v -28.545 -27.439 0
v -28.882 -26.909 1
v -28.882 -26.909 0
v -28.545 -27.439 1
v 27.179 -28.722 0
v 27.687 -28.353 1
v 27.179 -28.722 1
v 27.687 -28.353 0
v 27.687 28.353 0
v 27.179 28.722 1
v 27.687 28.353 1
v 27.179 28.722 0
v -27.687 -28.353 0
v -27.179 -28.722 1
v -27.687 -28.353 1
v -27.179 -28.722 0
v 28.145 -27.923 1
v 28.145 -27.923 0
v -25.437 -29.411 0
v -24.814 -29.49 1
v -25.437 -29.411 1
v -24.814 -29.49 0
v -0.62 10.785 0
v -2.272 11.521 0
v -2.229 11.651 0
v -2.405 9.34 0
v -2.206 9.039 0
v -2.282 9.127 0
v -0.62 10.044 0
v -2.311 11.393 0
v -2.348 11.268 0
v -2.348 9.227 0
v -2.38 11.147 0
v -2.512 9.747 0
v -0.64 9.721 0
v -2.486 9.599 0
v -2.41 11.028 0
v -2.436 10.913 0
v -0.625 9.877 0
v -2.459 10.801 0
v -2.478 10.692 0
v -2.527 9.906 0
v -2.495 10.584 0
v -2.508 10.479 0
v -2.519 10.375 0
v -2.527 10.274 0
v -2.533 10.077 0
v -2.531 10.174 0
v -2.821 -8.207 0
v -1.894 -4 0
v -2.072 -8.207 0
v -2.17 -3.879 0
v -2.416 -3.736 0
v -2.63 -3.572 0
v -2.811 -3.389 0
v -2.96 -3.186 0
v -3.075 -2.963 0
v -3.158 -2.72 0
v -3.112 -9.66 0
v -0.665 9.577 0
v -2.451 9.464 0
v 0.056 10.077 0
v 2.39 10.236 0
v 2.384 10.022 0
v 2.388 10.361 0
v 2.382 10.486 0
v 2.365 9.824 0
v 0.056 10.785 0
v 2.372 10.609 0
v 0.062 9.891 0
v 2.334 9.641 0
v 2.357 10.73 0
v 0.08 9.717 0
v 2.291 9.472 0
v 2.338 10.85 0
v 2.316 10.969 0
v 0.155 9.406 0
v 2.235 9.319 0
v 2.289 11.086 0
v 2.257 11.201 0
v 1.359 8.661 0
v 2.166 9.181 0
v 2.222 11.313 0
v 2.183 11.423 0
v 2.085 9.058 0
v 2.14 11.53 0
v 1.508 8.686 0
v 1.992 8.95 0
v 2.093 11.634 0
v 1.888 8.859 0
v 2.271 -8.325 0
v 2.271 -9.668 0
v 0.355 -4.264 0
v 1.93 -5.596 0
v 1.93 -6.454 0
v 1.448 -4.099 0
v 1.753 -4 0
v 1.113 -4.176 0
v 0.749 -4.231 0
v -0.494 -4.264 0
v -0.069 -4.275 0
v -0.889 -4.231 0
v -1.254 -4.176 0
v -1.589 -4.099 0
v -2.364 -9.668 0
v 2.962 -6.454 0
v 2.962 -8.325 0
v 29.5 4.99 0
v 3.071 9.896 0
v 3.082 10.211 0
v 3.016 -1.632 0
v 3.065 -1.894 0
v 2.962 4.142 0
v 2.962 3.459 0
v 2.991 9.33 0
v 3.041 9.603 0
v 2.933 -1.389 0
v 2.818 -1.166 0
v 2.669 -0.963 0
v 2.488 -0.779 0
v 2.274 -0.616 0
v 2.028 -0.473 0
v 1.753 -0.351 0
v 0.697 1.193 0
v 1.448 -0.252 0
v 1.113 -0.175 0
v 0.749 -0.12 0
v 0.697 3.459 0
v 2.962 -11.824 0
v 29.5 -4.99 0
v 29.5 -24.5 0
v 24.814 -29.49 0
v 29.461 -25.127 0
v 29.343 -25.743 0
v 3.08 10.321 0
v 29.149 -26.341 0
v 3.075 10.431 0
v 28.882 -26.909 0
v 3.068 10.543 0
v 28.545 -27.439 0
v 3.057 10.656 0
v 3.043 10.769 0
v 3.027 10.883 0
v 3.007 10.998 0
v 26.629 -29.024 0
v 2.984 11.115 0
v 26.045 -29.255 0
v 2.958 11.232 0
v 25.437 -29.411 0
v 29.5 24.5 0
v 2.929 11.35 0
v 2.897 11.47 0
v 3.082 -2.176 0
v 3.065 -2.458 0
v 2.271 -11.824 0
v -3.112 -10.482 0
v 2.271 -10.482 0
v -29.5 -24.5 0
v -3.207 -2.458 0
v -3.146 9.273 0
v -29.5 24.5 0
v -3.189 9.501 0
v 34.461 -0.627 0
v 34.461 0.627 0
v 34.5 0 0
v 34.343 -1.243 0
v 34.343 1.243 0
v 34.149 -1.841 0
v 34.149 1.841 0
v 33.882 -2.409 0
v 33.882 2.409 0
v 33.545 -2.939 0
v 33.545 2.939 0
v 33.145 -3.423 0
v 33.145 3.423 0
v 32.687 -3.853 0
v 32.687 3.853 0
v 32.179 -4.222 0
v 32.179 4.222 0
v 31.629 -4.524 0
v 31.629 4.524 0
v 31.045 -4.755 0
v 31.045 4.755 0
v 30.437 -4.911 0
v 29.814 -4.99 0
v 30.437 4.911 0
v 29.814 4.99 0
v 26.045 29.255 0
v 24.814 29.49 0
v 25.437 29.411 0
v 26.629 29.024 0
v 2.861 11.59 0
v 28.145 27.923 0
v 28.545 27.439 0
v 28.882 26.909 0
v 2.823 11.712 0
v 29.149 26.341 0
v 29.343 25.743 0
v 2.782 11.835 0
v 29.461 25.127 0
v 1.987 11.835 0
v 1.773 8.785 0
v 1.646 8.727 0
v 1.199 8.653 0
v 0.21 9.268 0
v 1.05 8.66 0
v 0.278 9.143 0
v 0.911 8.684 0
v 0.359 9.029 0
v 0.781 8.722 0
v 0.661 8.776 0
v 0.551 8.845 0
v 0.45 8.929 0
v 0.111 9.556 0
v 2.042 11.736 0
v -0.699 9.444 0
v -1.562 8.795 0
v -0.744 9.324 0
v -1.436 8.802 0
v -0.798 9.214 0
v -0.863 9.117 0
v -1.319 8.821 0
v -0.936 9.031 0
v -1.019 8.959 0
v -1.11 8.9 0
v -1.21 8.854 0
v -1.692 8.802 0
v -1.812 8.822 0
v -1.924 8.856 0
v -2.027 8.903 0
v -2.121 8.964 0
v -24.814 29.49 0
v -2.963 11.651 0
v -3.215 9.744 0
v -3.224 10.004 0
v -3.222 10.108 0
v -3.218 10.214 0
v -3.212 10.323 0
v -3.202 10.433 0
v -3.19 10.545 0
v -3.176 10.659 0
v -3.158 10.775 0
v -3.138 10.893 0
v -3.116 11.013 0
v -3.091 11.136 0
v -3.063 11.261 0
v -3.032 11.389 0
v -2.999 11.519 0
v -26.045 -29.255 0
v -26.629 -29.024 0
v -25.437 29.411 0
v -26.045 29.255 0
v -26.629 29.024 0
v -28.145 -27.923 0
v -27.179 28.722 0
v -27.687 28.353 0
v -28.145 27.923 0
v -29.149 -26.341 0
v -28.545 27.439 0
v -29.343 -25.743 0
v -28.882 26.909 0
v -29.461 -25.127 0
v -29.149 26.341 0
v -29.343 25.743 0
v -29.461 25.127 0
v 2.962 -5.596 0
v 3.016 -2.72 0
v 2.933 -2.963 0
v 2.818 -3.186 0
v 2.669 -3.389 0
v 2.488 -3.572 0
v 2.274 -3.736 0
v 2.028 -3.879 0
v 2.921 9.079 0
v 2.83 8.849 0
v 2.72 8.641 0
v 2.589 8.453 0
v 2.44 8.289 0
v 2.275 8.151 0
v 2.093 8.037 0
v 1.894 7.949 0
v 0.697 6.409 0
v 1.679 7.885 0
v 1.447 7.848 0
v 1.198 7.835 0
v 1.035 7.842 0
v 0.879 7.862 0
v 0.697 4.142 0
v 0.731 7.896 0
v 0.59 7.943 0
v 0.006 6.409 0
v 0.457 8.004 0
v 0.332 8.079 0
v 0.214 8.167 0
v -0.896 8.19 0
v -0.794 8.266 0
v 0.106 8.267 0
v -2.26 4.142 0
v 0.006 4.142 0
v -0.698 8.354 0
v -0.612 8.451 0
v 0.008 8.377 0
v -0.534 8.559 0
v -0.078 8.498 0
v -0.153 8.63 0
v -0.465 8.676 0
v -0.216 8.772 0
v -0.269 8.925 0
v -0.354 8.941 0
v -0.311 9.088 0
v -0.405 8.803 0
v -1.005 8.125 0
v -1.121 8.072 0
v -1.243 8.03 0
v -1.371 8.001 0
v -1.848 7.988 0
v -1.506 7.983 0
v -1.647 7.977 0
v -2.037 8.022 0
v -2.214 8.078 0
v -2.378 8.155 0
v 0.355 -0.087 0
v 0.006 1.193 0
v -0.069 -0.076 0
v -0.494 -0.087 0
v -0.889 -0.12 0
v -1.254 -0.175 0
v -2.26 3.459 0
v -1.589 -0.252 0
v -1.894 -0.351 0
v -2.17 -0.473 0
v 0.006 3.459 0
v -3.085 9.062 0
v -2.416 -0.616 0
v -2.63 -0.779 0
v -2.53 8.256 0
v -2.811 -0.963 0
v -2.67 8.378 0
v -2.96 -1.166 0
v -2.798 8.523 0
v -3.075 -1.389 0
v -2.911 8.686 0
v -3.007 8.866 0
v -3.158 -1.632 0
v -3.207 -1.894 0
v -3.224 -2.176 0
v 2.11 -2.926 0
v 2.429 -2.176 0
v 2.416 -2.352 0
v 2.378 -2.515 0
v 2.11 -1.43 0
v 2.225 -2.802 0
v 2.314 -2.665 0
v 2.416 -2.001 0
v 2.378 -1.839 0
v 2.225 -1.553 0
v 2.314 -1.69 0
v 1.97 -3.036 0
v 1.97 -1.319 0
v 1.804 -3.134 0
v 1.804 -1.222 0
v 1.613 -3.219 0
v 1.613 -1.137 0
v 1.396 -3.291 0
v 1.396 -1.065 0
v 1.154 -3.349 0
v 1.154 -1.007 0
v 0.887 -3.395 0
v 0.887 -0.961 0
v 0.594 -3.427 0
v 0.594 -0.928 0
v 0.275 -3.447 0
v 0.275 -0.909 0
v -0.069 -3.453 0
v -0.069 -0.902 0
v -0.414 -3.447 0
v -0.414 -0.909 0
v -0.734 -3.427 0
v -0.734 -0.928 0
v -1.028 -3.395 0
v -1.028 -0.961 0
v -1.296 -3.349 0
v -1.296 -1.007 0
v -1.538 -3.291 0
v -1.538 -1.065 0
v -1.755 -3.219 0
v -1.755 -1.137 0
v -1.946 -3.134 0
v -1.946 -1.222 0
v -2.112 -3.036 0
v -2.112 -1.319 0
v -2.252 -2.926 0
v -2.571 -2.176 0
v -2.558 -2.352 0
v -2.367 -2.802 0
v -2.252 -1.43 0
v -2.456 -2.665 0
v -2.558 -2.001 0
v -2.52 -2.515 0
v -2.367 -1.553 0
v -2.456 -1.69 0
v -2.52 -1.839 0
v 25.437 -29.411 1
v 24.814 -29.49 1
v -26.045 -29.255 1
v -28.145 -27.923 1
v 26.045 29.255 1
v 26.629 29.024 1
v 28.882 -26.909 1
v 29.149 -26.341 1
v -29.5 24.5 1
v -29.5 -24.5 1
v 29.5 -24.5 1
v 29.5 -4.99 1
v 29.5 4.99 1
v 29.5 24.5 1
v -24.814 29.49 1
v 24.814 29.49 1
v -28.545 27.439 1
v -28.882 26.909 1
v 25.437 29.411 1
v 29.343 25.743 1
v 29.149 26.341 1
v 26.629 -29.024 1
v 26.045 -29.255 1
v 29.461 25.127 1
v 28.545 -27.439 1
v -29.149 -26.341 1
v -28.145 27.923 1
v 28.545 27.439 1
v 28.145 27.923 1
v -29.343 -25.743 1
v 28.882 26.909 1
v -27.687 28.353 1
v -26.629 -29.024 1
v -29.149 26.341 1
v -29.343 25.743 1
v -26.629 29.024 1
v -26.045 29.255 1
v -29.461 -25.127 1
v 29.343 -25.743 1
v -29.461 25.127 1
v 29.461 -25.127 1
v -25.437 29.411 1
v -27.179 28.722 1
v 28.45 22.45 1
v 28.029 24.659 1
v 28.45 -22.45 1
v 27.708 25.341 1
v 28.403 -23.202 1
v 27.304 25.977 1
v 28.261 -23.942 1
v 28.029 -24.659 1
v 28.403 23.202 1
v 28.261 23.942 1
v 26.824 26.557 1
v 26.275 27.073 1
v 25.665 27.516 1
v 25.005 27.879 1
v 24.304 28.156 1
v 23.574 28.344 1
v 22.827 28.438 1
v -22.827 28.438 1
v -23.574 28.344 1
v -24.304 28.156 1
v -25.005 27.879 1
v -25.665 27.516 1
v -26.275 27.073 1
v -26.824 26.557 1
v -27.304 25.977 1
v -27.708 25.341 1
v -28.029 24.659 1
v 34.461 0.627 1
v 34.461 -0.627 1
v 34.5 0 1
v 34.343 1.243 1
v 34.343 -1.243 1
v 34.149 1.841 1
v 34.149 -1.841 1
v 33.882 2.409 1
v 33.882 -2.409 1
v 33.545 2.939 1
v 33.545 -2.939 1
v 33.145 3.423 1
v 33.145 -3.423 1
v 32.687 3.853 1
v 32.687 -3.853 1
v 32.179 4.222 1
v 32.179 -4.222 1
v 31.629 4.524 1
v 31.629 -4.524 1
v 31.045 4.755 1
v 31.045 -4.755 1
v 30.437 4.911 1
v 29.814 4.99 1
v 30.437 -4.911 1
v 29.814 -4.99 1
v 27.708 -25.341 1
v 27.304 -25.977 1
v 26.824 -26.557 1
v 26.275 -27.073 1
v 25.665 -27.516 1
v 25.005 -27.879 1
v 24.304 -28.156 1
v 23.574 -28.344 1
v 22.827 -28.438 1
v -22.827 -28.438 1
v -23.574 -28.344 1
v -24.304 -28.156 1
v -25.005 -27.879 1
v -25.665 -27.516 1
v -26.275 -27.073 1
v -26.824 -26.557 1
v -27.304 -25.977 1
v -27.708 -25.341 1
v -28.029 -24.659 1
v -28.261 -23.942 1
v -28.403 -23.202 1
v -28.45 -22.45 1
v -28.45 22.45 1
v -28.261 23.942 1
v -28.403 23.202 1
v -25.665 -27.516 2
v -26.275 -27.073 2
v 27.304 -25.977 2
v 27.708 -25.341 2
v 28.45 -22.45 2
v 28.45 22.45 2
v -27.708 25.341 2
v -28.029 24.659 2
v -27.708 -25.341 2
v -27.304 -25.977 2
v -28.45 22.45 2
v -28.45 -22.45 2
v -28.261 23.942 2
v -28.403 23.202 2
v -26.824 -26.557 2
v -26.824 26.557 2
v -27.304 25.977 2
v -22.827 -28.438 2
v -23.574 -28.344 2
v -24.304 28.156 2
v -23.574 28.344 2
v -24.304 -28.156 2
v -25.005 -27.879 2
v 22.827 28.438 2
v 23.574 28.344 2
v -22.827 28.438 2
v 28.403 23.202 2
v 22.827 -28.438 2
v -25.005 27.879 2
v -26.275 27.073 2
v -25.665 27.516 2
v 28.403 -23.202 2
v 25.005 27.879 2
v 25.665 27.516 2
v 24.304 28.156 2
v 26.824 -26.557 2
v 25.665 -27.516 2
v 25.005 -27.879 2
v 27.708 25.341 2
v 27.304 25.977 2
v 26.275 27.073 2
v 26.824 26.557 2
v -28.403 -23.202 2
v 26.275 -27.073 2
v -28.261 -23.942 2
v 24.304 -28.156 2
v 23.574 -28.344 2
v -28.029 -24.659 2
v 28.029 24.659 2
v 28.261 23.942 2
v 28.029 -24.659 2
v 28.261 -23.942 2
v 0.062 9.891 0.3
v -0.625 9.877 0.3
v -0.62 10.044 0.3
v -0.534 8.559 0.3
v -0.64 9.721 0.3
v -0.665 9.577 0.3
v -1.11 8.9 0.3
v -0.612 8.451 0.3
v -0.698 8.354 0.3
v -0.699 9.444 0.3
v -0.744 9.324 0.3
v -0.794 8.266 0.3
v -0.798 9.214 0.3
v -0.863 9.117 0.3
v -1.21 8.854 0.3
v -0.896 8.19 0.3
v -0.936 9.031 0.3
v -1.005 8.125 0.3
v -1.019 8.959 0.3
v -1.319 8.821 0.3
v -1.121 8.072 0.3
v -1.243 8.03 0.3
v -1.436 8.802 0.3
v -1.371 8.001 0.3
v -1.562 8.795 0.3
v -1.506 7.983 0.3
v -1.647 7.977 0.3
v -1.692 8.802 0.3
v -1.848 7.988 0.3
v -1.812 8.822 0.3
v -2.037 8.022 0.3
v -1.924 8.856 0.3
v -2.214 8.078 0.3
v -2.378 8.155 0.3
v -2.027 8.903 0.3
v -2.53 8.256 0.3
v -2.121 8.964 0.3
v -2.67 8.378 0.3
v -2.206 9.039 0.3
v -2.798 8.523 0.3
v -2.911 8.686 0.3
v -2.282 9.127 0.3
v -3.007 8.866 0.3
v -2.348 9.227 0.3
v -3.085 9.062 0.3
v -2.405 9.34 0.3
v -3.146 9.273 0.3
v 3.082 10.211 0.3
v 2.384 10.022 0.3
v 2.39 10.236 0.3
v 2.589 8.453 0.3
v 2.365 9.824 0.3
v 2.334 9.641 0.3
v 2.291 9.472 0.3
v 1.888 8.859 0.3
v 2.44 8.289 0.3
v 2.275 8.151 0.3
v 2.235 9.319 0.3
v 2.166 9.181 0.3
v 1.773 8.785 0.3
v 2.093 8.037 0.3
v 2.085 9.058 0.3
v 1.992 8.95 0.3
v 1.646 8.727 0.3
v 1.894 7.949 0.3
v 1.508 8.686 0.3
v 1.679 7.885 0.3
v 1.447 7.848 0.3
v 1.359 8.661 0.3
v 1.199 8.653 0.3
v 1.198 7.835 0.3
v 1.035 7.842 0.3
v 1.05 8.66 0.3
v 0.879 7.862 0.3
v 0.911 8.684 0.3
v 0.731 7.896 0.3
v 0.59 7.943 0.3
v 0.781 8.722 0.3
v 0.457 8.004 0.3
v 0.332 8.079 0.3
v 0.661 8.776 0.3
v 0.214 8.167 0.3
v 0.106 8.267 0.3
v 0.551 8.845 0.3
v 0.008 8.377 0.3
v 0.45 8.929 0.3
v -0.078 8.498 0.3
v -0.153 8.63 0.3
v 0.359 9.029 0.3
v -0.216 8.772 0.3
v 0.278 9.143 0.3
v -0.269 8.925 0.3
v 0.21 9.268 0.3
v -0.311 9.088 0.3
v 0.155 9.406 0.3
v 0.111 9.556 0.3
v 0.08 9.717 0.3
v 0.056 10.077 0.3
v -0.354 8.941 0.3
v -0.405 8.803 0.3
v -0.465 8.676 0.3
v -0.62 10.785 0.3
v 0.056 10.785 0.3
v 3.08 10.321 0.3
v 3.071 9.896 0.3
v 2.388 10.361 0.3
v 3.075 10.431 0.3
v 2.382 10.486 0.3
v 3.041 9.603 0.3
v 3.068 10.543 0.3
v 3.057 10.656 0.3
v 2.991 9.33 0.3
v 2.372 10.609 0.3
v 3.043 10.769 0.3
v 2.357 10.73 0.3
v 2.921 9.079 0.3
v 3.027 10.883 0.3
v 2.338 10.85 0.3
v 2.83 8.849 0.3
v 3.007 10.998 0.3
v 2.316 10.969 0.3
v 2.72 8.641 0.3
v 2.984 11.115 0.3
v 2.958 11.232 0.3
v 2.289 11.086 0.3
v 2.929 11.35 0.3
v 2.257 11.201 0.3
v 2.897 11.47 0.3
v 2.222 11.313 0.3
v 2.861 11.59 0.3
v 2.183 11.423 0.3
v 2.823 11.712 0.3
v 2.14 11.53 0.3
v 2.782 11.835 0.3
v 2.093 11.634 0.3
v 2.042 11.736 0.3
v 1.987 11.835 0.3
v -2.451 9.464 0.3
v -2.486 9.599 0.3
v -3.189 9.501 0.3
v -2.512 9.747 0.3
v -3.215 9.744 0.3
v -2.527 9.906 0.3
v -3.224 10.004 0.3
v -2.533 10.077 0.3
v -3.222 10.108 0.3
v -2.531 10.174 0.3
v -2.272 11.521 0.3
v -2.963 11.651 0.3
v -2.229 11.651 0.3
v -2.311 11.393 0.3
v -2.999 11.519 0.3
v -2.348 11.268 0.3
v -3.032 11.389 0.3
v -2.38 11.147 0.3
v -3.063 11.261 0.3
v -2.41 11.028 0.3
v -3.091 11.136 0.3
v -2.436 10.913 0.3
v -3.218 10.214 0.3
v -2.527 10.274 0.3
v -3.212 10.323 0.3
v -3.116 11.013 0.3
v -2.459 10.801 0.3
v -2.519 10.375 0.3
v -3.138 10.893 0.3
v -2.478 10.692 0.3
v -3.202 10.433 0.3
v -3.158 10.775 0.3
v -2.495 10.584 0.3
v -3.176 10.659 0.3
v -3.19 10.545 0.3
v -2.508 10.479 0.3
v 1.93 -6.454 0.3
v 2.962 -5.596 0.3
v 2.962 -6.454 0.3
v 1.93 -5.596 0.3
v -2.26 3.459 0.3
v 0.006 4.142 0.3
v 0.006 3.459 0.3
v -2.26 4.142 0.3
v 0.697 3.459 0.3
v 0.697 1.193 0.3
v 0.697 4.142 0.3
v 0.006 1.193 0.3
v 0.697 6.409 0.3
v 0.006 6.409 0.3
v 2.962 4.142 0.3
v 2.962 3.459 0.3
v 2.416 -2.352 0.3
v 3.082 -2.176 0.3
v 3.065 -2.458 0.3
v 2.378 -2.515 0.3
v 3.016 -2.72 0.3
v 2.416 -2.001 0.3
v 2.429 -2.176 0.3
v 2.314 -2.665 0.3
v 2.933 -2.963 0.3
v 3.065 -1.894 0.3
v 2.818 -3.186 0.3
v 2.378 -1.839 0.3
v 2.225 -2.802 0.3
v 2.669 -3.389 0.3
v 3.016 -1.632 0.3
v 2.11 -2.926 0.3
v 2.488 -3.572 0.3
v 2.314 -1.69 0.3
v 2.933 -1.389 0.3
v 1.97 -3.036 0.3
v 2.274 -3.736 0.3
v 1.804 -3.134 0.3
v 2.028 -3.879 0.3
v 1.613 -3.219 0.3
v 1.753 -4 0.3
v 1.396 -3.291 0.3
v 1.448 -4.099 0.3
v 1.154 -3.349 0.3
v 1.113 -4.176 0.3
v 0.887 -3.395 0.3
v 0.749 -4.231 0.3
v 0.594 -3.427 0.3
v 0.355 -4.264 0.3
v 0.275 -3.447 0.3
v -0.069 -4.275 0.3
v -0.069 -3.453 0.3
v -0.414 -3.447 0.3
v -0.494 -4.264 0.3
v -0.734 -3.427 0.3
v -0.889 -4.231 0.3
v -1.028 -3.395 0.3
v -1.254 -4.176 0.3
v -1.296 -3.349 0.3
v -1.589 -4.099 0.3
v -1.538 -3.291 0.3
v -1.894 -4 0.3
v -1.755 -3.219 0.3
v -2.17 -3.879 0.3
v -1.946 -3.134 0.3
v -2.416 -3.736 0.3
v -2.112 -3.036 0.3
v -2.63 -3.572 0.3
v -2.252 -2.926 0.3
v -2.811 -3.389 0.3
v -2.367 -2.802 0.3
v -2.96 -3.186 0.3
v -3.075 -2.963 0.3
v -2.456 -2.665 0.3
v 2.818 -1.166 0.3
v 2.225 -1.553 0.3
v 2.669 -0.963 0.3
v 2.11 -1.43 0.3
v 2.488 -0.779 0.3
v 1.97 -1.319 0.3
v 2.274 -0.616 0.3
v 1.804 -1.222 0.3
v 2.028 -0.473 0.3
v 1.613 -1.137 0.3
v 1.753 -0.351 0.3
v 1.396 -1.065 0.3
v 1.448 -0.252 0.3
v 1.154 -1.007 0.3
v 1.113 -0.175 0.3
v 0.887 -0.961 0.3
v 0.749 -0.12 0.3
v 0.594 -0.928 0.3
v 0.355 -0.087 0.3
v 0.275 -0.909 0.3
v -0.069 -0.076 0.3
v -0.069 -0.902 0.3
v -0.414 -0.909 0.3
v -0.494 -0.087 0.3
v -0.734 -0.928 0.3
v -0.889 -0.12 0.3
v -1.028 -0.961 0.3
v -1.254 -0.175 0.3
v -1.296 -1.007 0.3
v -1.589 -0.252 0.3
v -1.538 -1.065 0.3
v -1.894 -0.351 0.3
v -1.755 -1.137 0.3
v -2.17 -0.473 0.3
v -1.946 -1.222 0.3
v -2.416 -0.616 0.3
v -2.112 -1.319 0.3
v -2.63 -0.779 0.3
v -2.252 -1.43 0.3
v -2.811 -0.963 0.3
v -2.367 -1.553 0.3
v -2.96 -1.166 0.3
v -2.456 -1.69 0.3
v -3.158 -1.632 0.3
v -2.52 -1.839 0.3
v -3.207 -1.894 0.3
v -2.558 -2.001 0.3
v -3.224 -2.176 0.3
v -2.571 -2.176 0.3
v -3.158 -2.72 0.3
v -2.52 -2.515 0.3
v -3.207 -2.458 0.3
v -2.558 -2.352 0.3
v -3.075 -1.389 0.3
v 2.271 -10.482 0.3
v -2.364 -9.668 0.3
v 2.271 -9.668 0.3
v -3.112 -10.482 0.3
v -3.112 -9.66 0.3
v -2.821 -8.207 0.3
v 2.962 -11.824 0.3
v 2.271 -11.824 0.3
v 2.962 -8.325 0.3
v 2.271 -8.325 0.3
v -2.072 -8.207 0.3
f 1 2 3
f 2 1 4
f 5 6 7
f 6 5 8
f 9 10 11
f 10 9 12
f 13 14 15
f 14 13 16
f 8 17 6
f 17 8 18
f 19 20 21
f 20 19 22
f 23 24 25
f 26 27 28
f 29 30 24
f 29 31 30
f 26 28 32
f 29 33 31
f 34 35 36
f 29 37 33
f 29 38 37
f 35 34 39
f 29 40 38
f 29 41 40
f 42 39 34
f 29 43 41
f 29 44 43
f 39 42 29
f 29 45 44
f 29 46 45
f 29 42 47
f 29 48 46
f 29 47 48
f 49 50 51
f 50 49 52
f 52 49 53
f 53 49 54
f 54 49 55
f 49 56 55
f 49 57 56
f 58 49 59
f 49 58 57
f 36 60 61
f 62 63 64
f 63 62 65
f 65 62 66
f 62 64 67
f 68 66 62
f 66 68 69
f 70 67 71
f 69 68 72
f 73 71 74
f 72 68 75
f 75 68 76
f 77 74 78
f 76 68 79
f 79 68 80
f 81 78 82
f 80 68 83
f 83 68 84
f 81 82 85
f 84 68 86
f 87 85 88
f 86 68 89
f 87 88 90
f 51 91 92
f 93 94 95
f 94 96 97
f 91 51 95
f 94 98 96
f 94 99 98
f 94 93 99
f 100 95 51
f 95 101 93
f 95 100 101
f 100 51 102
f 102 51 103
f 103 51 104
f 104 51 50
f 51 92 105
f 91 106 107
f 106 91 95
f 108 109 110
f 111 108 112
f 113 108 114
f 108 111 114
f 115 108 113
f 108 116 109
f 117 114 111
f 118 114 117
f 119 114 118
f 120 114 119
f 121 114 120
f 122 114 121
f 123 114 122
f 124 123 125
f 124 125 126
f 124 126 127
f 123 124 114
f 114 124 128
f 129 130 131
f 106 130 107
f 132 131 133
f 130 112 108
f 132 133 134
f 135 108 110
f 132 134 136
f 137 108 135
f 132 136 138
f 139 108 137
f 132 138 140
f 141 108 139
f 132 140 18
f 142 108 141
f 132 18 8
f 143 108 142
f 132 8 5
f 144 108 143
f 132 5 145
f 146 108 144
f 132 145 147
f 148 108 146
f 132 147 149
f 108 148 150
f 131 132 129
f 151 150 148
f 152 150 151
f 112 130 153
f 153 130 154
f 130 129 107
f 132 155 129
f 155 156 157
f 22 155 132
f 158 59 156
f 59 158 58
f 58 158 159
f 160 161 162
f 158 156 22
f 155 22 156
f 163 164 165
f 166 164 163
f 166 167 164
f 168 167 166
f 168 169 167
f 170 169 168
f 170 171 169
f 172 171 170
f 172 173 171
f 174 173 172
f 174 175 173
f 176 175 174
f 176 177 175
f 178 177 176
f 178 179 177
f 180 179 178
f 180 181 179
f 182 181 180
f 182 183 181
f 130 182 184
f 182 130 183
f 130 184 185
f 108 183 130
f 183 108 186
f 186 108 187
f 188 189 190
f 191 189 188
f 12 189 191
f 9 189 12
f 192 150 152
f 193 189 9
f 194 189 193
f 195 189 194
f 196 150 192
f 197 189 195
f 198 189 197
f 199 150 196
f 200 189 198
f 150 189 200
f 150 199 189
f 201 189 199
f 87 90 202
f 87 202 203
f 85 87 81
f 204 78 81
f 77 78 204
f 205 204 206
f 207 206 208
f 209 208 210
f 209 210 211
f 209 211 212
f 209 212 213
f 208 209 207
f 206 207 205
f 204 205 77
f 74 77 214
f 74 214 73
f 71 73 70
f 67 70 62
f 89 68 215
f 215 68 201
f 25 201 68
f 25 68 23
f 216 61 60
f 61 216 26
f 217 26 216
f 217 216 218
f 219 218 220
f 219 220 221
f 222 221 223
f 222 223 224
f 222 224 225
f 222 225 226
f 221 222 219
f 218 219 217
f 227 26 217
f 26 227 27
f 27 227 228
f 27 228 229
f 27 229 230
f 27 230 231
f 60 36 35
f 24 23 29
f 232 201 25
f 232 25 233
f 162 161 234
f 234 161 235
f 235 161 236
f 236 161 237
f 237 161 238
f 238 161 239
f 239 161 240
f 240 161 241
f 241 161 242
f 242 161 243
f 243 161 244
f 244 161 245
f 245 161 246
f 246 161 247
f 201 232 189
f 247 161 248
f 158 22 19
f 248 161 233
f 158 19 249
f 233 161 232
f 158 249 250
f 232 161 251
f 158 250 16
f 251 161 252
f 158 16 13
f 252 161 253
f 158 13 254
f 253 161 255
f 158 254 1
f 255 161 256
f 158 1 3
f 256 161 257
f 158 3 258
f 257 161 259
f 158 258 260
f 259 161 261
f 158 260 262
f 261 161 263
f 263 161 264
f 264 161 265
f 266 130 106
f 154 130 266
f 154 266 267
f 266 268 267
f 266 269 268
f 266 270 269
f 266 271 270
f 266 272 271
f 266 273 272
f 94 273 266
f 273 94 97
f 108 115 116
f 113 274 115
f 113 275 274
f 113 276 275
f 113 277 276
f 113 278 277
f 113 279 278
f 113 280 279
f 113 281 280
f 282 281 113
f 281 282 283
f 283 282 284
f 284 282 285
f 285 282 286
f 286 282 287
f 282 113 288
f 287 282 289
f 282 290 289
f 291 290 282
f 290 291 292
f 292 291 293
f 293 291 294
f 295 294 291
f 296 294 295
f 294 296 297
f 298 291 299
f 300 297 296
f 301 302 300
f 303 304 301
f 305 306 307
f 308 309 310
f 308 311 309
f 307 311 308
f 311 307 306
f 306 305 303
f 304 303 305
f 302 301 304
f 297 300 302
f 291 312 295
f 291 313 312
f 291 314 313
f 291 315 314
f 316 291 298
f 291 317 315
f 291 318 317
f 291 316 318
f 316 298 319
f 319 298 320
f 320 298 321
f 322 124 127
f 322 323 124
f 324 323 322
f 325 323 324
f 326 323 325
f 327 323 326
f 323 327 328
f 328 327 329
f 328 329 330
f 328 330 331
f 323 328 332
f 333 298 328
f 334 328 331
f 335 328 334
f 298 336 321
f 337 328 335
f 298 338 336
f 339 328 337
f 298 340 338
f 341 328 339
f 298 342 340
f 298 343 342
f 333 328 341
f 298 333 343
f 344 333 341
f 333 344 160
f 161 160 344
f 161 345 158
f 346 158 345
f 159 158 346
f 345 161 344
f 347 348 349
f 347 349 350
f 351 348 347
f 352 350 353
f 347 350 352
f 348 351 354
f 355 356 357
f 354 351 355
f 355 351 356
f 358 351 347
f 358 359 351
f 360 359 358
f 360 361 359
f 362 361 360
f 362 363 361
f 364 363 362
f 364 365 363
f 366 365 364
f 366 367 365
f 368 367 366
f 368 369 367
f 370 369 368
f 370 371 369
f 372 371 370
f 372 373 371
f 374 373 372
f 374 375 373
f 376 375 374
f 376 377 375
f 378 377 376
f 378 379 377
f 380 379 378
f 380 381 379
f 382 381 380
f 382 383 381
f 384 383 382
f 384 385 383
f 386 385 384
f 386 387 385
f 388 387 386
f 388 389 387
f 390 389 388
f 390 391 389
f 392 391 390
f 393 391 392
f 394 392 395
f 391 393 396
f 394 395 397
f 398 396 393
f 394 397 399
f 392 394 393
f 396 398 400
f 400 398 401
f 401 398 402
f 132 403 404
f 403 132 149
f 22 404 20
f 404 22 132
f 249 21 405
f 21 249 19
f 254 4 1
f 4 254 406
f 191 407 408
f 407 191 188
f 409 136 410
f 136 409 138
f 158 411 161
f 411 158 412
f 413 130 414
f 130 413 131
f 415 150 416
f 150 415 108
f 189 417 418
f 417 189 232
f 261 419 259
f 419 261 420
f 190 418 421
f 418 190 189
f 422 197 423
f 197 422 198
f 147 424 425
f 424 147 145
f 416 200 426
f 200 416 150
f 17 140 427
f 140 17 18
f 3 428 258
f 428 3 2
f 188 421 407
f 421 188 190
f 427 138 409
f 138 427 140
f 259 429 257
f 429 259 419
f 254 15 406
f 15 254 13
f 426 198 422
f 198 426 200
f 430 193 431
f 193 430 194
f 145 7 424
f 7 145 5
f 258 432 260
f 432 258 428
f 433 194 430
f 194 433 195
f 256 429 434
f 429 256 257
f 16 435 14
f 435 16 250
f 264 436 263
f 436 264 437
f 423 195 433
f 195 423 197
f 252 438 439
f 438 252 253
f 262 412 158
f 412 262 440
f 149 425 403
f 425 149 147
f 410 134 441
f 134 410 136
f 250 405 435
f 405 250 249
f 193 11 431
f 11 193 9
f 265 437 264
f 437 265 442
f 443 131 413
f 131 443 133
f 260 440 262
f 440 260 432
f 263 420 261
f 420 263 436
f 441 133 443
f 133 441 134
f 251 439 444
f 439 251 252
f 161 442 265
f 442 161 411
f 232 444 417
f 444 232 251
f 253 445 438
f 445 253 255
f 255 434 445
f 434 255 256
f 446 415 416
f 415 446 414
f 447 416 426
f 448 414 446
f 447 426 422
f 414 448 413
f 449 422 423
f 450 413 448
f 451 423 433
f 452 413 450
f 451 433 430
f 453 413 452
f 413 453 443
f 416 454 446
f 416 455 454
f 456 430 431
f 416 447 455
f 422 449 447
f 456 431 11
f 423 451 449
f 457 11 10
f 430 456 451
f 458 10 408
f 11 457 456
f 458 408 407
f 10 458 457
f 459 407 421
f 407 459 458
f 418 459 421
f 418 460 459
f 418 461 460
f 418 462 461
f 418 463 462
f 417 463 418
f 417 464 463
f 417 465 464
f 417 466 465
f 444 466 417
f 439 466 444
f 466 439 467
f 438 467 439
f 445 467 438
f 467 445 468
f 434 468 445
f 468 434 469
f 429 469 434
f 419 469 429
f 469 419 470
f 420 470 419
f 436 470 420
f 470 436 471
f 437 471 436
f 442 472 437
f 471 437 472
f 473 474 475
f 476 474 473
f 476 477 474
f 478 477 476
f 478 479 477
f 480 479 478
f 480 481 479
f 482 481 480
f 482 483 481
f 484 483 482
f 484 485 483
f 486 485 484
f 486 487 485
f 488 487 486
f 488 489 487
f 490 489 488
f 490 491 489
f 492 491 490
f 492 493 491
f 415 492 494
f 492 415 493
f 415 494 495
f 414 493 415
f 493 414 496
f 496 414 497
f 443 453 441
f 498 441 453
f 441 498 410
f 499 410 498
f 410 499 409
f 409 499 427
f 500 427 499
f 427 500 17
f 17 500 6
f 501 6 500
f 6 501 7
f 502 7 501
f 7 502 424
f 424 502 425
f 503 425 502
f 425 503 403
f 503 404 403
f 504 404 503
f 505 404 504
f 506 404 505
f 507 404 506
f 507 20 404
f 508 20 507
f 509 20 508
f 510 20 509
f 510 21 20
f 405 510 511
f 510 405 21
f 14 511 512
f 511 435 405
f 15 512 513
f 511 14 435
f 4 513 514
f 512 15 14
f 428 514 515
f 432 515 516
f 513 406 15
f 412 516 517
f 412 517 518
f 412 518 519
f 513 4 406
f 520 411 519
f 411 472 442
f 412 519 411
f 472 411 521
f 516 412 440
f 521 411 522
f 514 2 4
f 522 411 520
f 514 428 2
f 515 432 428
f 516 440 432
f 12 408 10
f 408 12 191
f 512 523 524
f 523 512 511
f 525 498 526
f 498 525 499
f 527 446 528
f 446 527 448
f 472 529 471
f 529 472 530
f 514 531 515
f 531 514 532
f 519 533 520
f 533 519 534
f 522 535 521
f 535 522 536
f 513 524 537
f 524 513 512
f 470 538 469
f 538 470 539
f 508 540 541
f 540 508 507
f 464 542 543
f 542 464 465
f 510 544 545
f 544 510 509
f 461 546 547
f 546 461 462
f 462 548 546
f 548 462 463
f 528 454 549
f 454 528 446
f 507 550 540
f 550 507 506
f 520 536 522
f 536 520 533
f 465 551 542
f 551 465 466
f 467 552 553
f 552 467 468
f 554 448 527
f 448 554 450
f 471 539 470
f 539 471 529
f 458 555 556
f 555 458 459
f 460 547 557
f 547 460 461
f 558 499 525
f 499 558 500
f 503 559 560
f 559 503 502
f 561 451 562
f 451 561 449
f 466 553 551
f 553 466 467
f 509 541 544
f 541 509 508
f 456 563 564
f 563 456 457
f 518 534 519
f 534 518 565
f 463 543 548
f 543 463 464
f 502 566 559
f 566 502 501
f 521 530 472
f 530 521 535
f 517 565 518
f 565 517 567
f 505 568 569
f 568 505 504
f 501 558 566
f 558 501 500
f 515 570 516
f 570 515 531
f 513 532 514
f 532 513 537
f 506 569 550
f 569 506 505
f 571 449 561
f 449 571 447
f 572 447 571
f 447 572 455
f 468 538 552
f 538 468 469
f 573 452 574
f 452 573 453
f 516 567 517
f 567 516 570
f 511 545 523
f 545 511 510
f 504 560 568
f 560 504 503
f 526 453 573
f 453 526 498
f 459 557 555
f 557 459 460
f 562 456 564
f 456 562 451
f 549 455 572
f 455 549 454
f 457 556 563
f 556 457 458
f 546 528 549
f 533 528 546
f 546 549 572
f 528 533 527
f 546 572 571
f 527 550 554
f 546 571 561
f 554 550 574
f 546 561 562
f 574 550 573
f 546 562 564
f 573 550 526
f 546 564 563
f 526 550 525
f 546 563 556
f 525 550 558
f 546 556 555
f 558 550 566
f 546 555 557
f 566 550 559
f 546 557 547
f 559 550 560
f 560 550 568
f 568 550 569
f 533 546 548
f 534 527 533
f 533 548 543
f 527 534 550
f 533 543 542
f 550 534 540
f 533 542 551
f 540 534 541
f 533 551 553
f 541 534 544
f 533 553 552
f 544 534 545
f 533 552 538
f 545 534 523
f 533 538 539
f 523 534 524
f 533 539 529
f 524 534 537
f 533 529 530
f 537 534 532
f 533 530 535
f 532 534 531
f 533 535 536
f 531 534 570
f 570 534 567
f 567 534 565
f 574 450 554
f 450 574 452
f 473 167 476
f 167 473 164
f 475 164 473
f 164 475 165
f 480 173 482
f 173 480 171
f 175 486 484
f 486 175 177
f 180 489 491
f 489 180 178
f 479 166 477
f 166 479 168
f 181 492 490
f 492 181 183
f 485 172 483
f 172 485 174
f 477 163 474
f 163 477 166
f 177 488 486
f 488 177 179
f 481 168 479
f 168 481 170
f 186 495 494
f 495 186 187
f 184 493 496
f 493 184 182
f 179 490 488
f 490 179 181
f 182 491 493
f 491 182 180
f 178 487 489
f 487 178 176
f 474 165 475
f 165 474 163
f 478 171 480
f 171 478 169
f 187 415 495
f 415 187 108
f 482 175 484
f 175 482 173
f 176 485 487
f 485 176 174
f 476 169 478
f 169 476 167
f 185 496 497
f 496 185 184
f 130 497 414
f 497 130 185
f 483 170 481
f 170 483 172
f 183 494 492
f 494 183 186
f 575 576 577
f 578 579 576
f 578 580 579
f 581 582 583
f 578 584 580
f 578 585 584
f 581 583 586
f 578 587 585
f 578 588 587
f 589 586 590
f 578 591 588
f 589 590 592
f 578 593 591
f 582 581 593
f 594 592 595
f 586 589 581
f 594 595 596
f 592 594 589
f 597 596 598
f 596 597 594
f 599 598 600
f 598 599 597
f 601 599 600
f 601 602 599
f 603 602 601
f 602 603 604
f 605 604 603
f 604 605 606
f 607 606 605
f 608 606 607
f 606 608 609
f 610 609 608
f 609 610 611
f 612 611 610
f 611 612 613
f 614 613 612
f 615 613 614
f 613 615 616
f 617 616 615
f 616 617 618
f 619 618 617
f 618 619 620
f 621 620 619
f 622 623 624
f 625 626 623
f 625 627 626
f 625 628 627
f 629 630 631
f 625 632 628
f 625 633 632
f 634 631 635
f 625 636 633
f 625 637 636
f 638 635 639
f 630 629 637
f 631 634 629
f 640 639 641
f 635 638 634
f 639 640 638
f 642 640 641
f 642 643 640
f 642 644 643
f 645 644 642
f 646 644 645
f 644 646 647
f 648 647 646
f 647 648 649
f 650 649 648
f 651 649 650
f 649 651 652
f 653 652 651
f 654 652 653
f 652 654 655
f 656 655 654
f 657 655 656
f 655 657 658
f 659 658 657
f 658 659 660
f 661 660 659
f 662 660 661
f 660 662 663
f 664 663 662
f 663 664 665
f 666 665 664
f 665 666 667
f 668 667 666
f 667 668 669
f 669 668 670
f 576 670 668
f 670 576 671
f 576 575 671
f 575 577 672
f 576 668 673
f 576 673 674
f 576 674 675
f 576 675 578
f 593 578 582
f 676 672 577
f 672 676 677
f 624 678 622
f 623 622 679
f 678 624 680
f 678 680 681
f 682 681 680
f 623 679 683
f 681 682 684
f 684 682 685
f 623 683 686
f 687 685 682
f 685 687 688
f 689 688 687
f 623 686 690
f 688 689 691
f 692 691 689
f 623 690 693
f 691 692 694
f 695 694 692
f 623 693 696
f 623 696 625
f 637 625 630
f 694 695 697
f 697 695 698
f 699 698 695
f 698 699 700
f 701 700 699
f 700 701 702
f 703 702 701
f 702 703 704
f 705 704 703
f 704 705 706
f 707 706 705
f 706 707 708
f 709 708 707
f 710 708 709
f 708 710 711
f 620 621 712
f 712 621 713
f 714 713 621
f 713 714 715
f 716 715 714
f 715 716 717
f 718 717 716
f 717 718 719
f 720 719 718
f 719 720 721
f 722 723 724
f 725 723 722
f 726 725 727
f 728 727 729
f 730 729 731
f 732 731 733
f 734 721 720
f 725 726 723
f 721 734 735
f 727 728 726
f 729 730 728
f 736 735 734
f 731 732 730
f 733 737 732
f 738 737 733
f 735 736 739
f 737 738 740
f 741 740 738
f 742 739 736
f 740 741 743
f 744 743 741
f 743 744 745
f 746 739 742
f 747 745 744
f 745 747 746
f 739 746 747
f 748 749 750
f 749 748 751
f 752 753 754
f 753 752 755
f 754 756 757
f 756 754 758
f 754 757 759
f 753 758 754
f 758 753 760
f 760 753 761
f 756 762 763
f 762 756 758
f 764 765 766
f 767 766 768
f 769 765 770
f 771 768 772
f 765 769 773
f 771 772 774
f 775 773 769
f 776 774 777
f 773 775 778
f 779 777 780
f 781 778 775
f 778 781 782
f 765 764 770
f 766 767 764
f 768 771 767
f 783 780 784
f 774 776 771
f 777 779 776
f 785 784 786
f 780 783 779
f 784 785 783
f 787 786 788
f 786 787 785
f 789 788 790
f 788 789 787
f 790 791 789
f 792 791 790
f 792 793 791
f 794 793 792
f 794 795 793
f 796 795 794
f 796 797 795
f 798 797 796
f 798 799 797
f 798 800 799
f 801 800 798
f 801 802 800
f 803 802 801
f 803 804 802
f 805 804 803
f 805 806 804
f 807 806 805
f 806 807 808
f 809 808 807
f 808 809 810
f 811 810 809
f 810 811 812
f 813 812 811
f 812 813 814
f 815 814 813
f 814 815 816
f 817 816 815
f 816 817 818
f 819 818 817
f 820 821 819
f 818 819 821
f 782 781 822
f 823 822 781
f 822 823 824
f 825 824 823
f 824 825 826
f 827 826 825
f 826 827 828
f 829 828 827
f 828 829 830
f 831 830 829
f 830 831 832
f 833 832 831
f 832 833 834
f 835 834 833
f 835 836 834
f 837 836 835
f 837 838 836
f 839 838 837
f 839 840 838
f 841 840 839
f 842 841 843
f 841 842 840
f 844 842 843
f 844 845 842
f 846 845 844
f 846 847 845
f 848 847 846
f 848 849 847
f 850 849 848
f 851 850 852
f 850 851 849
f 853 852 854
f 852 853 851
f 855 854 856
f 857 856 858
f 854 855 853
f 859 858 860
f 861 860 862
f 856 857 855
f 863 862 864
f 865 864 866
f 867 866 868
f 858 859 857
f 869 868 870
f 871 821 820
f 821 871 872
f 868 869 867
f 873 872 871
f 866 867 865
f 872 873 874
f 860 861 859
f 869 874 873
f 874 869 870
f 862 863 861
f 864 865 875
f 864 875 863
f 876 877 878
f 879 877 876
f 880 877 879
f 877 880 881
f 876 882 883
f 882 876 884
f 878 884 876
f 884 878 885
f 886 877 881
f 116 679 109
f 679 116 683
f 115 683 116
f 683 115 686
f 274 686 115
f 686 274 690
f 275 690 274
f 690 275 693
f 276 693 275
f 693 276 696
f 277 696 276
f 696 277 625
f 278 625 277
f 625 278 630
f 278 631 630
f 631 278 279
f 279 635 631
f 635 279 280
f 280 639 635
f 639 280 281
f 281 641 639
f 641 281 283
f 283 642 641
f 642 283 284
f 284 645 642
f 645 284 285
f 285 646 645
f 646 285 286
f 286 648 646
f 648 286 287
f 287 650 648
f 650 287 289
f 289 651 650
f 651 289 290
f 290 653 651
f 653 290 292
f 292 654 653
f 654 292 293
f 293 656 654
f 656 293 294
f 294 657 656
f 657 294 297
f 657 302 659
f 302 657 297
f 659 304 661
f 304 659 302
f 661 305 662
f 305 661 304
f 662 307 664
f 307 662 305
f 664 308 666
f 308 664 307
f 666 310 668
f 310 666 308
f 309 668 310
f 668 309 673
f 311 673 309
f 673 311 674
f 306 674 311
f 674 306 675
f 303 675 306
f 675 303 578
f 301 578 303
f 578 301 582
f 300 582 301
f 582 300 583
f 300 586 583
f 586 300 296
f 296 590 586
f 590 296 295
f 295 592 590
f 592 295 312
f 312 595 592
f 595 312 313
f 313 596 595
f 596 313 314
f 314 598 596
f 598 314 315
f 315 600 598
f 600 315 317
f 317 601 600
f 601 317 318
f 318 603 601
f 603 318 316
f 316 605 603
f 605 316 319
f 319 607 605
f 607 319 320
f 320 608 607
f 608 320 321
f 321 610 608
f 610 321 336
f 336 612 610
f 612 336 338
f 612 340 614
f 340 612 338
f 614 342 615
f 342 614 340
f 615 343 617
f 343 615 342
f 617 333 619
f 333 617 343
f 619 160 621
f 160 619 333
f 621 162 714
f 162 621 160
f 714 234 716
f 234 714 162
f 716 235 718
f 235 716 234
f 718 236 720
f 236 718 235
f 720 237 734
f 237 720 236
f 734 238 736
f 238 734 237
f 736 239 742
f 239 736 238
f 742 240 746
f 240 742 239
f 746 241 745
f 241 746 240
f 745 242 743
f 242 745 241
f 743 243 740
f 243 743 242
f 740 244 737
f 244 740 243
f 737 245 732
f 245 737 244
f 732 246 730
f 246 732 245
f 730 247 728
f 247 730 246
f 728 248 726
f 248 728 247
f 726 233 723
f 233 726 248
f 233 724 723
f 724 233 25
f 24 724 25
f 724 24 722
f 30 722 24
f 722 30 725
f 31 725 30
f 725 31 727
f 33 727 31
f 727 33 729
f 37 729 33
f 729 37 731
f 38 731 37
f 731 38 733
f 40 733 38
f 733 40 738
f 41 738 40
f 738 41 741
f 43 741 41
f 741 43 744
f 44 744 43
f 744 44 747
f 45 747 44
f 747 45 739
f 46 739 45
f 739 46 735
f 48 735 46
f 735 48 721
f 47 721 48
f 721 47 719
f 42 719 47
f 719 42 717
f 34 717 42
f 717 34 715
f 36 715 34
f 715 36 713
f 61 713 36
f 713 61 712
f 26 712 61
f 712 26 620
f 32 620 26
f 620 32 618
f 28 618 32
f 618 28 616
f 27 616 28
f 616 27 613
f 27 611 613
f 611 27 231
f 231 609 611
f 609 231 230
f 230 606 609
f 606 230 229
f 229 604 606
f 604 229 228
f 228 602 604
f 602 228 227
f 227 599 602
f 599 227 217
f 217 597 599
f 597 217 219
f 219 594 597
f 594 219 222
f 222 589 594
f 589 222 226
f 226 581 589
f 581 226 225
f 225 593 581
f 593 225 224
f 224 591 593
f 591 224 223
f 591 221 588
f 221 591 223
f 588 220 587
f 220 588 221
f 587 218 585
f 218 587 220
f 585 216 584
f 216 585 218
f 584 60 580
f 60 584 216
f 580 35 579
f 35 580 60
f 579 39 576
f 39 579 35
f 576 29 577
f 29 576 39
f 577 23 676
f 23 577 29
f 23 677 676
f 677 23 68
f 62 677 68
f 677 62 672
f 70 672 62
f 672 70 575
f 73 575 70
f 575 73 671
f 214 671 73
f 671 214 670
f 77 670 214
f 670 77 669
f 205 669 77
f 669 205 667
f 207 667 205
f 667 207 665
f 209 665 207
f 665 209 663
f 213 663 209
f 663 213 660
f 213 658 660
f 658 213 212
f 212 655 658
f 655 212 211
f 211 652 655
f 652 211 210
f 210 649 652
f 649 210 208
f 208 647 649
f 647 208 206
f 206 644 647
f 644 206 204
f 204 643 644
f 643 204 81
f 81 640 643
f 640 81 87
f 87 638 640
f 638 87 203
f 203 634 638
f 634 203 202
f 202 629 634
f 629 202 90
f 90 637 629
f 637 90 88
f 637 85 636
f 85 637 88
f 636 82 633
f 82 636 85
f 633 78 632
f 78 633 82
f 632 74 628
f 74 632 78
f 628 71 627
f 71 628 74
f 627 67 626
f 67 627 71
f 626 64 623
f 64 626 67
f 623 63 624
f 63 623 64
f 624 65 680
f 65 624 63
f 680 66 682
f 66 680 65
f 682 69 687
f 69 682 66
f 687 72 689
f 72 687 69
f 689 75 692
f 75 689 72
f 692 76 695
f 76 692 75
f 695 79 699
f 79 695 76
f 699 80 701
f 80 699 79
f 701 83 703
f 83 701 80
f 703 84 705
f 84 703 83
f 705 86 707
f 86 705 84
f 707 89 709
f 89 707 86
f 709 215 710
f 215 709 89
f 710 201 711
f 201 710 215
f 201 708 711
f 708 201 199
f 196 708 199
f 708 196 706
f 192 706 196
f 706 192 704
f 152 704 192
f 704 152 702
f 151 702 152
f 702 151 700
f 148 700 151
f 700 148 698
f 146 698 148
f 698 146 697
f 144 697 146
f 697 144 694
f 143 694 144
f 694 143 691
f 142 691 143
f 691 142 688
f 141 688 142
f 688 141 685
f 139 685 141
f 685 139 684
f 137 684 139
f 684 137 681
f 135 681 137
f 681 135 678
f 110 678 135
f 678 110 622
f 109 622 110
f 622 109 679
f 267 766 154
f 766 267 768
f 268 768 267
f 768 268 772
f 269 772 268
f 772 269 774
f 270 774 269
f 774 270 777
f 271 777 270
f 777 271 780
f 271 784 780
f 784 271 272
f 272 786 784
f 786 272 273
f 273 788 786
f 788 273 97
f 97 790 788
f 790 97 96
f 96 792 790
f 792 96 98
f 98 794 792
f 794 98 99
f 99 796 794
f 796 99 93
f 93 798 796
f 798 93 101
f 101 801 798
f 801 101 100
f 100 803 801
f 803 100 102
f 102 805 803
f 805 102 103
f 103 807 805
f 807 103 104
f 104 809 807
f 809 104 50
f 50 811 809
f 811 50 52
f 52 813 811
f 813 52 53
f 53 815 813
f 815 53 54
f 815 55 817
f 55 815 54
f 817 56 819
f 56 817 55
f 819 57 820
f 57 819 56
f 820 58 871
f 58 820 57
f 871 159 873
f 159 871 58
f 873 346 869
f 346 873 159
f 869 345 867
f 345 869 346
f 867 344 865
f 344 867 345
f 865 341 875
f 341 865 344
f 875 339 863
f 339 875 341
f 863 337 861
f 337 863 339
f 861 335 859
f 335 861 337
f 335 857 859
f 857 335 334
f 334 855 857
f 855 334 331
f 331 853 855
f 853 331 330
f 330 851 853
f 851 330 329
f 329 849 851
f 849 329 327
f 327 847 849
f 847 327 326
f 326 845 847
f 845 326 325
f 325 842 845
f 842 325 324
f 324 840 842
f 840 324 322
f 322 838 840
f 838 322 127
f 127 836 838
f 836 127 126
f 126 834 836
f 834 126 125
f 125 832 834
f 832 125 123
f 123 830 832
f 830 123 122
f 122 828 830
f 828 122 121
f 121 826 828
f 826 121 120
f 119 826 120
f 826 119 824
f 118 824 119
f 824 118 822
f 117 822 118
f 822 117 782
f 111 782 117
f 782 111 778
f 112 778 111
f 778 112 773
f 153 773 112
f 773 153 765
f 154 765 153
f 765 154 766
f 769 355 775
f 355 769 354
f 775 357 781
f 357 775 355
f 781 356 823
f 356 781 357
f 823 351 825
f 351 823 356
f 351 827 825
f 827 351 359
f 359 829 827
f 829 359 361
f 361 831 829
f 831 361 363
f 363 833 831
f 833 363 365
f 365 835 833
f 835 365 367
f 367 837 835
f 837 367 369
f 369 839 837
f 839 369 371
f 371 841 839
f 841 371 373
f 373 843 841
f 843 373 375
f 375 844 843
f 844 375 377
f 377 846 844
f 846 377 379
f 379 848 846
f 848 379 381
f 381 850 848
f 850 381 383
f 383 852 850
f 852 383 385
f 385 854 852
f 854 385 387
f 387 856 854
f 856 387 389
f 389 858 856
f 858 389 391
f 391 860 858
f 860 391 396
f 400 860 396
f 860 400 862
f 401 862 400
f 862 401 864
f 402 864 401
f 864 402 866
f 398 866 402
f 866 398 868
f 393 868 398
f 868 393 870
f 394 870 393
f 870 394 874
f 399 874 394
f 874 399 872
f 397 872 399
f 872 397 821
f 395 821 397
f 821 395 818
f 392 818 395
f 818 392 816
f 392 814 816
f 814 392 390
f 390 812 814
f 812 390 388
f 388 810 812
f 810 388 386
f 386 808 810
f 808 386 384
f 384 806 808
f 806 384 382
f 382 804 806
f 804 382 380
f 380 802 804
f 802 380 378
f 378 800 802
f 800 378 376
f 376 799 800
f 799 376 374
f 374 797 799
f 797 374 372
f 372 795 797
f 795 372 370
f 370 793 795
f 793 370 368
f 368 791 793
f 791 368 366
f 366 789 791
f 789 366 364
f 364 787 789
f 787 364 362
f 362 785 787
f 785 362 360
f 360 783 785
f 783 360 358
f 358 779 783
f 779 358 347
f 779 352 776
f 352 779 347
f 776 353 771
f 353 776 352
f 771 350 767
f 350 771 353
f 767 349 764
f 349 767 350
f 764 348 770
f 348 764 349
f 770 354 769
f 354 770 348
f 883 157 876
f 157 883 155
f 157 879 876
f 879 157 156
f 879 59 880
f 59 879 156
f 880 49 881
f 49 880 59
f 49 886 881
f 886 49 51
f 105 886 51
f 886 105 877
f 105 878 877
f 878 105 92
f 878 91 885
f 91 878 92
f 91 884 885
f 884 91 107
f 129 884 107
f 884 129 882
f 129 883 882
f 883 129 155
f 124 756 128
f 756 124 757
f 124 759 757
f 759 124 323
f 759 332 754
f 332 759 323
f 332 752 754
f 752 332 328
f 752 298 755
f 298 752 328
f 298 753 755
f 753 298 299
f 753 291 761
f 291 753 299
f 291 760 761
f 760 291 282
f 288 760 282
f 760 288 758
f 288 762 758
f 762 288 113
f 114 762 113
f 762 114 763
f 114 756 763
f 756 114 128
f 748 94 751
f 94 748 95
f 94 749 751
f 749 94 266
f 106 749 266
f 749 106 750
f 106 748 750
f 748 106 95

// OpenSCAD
$fn = 50;


difference() {
	union() {
		translate(v = [0, 0, 0]) {
			rotate(a = [0, 0, 0]) {
				hull() {
					translate(v = [-24.5000000000, 24.5000000000, 0]) {
						rotate(a = [0, 0, 0]) {
							translate(v = [0, 0, 0]) {
								rotate(a = [0, 0, 0]) {
									cylinder(h = 1, r = 5);
								}
							}
						}
					}
					translate(v = [24.5000000000, 24.5000000000, 0]) {
						rotate(a = [0, 0, 0]) {
							translate(v = [0, 0, 0]) {
								rotate(a = [0, 0, 0]) {
									cylinder(h = 1, r = 5);
								}
							}
						}
					}
					translate(v = [-24.5000000000, -24.5000000000, 0]) {
						rotate(a = [0, 0, 0]) {
							translate(v = [0, 0, 0]) {
								rotate(a = [0, 0, 0]) {
									cylinder(h = 1, r = 5);
								}
							}
						}
					}
					translate(v = [24.5000000000, -24.5000000000, 0]) {
						rotate(a = [0, 0, 0]) {
							translate(v = [0, 0, 0]) {
								rotate(a = [0, 0, 0]) {
									cylinder(h = 1, r = 5);
								}
							}
						}
					}
				}
			}
		}
		translate(v = [0, 0, 0]) {
			rotate(a = [0, 0, 0]) {
				hull() {
					translate(v = [-22.4500000000, 22.4500000000, 0]) {
						rotate(a = [0, 0, 0]) {
							translate(v = [0, 0, 0]) {
								rotate(a = [0, 0, 0]) {
									cylinder(h = 2, r = 6);
								}
							}
						}
					}
					translate(v = [22.4500000000, 22.4500000000, 0]) {
						rotate(a = [0, 0, 0]) {
							translate(v = [0, 0, 0]) {
								rotate(a = [0, 0, 0]) {
									cylinder(h = 2, r = 6);
								}
							}
						}
					}
					translate(v = [-22.4500000000, -22.4500000000, 0]) {
						rotate(a = [0, 0, 0]) {
							translate(v = [0, 0, 0]) {
								rotate(a = [0, 0, 0]) {
									cylinder(h = 2, r = 6);
								}
							}
						}
					}
					translate(v = [22.4500000000, -22.4500000000, 0]) {
						rotate(a = [0, 0, 0]) {
							translate(v = [0, 0, 0]) {
								rotate(a = [0, 0, 0]) {
									cylinder(h = 2, r = 6);
								}
							}
						}
					}
				}
			}
		}
		translate(v = [29.5000000000, 0, 0.0000000000]) {
			rotate(a = [0, 0, 0]) {
				cylinder(h = 1, r = 5);
			}
		}
	}
	union() {
		translate(v = [0, 0, 0.3000000000]) {
			rotate(a = [0, 180, 90]) {
				linear_extrude(height = 0.3000000000) {
					text(font = "Candara:Light", halign = "center", size = 6, text = "3+0.1", valign = "center");
				}
			}
		}
	}
}
